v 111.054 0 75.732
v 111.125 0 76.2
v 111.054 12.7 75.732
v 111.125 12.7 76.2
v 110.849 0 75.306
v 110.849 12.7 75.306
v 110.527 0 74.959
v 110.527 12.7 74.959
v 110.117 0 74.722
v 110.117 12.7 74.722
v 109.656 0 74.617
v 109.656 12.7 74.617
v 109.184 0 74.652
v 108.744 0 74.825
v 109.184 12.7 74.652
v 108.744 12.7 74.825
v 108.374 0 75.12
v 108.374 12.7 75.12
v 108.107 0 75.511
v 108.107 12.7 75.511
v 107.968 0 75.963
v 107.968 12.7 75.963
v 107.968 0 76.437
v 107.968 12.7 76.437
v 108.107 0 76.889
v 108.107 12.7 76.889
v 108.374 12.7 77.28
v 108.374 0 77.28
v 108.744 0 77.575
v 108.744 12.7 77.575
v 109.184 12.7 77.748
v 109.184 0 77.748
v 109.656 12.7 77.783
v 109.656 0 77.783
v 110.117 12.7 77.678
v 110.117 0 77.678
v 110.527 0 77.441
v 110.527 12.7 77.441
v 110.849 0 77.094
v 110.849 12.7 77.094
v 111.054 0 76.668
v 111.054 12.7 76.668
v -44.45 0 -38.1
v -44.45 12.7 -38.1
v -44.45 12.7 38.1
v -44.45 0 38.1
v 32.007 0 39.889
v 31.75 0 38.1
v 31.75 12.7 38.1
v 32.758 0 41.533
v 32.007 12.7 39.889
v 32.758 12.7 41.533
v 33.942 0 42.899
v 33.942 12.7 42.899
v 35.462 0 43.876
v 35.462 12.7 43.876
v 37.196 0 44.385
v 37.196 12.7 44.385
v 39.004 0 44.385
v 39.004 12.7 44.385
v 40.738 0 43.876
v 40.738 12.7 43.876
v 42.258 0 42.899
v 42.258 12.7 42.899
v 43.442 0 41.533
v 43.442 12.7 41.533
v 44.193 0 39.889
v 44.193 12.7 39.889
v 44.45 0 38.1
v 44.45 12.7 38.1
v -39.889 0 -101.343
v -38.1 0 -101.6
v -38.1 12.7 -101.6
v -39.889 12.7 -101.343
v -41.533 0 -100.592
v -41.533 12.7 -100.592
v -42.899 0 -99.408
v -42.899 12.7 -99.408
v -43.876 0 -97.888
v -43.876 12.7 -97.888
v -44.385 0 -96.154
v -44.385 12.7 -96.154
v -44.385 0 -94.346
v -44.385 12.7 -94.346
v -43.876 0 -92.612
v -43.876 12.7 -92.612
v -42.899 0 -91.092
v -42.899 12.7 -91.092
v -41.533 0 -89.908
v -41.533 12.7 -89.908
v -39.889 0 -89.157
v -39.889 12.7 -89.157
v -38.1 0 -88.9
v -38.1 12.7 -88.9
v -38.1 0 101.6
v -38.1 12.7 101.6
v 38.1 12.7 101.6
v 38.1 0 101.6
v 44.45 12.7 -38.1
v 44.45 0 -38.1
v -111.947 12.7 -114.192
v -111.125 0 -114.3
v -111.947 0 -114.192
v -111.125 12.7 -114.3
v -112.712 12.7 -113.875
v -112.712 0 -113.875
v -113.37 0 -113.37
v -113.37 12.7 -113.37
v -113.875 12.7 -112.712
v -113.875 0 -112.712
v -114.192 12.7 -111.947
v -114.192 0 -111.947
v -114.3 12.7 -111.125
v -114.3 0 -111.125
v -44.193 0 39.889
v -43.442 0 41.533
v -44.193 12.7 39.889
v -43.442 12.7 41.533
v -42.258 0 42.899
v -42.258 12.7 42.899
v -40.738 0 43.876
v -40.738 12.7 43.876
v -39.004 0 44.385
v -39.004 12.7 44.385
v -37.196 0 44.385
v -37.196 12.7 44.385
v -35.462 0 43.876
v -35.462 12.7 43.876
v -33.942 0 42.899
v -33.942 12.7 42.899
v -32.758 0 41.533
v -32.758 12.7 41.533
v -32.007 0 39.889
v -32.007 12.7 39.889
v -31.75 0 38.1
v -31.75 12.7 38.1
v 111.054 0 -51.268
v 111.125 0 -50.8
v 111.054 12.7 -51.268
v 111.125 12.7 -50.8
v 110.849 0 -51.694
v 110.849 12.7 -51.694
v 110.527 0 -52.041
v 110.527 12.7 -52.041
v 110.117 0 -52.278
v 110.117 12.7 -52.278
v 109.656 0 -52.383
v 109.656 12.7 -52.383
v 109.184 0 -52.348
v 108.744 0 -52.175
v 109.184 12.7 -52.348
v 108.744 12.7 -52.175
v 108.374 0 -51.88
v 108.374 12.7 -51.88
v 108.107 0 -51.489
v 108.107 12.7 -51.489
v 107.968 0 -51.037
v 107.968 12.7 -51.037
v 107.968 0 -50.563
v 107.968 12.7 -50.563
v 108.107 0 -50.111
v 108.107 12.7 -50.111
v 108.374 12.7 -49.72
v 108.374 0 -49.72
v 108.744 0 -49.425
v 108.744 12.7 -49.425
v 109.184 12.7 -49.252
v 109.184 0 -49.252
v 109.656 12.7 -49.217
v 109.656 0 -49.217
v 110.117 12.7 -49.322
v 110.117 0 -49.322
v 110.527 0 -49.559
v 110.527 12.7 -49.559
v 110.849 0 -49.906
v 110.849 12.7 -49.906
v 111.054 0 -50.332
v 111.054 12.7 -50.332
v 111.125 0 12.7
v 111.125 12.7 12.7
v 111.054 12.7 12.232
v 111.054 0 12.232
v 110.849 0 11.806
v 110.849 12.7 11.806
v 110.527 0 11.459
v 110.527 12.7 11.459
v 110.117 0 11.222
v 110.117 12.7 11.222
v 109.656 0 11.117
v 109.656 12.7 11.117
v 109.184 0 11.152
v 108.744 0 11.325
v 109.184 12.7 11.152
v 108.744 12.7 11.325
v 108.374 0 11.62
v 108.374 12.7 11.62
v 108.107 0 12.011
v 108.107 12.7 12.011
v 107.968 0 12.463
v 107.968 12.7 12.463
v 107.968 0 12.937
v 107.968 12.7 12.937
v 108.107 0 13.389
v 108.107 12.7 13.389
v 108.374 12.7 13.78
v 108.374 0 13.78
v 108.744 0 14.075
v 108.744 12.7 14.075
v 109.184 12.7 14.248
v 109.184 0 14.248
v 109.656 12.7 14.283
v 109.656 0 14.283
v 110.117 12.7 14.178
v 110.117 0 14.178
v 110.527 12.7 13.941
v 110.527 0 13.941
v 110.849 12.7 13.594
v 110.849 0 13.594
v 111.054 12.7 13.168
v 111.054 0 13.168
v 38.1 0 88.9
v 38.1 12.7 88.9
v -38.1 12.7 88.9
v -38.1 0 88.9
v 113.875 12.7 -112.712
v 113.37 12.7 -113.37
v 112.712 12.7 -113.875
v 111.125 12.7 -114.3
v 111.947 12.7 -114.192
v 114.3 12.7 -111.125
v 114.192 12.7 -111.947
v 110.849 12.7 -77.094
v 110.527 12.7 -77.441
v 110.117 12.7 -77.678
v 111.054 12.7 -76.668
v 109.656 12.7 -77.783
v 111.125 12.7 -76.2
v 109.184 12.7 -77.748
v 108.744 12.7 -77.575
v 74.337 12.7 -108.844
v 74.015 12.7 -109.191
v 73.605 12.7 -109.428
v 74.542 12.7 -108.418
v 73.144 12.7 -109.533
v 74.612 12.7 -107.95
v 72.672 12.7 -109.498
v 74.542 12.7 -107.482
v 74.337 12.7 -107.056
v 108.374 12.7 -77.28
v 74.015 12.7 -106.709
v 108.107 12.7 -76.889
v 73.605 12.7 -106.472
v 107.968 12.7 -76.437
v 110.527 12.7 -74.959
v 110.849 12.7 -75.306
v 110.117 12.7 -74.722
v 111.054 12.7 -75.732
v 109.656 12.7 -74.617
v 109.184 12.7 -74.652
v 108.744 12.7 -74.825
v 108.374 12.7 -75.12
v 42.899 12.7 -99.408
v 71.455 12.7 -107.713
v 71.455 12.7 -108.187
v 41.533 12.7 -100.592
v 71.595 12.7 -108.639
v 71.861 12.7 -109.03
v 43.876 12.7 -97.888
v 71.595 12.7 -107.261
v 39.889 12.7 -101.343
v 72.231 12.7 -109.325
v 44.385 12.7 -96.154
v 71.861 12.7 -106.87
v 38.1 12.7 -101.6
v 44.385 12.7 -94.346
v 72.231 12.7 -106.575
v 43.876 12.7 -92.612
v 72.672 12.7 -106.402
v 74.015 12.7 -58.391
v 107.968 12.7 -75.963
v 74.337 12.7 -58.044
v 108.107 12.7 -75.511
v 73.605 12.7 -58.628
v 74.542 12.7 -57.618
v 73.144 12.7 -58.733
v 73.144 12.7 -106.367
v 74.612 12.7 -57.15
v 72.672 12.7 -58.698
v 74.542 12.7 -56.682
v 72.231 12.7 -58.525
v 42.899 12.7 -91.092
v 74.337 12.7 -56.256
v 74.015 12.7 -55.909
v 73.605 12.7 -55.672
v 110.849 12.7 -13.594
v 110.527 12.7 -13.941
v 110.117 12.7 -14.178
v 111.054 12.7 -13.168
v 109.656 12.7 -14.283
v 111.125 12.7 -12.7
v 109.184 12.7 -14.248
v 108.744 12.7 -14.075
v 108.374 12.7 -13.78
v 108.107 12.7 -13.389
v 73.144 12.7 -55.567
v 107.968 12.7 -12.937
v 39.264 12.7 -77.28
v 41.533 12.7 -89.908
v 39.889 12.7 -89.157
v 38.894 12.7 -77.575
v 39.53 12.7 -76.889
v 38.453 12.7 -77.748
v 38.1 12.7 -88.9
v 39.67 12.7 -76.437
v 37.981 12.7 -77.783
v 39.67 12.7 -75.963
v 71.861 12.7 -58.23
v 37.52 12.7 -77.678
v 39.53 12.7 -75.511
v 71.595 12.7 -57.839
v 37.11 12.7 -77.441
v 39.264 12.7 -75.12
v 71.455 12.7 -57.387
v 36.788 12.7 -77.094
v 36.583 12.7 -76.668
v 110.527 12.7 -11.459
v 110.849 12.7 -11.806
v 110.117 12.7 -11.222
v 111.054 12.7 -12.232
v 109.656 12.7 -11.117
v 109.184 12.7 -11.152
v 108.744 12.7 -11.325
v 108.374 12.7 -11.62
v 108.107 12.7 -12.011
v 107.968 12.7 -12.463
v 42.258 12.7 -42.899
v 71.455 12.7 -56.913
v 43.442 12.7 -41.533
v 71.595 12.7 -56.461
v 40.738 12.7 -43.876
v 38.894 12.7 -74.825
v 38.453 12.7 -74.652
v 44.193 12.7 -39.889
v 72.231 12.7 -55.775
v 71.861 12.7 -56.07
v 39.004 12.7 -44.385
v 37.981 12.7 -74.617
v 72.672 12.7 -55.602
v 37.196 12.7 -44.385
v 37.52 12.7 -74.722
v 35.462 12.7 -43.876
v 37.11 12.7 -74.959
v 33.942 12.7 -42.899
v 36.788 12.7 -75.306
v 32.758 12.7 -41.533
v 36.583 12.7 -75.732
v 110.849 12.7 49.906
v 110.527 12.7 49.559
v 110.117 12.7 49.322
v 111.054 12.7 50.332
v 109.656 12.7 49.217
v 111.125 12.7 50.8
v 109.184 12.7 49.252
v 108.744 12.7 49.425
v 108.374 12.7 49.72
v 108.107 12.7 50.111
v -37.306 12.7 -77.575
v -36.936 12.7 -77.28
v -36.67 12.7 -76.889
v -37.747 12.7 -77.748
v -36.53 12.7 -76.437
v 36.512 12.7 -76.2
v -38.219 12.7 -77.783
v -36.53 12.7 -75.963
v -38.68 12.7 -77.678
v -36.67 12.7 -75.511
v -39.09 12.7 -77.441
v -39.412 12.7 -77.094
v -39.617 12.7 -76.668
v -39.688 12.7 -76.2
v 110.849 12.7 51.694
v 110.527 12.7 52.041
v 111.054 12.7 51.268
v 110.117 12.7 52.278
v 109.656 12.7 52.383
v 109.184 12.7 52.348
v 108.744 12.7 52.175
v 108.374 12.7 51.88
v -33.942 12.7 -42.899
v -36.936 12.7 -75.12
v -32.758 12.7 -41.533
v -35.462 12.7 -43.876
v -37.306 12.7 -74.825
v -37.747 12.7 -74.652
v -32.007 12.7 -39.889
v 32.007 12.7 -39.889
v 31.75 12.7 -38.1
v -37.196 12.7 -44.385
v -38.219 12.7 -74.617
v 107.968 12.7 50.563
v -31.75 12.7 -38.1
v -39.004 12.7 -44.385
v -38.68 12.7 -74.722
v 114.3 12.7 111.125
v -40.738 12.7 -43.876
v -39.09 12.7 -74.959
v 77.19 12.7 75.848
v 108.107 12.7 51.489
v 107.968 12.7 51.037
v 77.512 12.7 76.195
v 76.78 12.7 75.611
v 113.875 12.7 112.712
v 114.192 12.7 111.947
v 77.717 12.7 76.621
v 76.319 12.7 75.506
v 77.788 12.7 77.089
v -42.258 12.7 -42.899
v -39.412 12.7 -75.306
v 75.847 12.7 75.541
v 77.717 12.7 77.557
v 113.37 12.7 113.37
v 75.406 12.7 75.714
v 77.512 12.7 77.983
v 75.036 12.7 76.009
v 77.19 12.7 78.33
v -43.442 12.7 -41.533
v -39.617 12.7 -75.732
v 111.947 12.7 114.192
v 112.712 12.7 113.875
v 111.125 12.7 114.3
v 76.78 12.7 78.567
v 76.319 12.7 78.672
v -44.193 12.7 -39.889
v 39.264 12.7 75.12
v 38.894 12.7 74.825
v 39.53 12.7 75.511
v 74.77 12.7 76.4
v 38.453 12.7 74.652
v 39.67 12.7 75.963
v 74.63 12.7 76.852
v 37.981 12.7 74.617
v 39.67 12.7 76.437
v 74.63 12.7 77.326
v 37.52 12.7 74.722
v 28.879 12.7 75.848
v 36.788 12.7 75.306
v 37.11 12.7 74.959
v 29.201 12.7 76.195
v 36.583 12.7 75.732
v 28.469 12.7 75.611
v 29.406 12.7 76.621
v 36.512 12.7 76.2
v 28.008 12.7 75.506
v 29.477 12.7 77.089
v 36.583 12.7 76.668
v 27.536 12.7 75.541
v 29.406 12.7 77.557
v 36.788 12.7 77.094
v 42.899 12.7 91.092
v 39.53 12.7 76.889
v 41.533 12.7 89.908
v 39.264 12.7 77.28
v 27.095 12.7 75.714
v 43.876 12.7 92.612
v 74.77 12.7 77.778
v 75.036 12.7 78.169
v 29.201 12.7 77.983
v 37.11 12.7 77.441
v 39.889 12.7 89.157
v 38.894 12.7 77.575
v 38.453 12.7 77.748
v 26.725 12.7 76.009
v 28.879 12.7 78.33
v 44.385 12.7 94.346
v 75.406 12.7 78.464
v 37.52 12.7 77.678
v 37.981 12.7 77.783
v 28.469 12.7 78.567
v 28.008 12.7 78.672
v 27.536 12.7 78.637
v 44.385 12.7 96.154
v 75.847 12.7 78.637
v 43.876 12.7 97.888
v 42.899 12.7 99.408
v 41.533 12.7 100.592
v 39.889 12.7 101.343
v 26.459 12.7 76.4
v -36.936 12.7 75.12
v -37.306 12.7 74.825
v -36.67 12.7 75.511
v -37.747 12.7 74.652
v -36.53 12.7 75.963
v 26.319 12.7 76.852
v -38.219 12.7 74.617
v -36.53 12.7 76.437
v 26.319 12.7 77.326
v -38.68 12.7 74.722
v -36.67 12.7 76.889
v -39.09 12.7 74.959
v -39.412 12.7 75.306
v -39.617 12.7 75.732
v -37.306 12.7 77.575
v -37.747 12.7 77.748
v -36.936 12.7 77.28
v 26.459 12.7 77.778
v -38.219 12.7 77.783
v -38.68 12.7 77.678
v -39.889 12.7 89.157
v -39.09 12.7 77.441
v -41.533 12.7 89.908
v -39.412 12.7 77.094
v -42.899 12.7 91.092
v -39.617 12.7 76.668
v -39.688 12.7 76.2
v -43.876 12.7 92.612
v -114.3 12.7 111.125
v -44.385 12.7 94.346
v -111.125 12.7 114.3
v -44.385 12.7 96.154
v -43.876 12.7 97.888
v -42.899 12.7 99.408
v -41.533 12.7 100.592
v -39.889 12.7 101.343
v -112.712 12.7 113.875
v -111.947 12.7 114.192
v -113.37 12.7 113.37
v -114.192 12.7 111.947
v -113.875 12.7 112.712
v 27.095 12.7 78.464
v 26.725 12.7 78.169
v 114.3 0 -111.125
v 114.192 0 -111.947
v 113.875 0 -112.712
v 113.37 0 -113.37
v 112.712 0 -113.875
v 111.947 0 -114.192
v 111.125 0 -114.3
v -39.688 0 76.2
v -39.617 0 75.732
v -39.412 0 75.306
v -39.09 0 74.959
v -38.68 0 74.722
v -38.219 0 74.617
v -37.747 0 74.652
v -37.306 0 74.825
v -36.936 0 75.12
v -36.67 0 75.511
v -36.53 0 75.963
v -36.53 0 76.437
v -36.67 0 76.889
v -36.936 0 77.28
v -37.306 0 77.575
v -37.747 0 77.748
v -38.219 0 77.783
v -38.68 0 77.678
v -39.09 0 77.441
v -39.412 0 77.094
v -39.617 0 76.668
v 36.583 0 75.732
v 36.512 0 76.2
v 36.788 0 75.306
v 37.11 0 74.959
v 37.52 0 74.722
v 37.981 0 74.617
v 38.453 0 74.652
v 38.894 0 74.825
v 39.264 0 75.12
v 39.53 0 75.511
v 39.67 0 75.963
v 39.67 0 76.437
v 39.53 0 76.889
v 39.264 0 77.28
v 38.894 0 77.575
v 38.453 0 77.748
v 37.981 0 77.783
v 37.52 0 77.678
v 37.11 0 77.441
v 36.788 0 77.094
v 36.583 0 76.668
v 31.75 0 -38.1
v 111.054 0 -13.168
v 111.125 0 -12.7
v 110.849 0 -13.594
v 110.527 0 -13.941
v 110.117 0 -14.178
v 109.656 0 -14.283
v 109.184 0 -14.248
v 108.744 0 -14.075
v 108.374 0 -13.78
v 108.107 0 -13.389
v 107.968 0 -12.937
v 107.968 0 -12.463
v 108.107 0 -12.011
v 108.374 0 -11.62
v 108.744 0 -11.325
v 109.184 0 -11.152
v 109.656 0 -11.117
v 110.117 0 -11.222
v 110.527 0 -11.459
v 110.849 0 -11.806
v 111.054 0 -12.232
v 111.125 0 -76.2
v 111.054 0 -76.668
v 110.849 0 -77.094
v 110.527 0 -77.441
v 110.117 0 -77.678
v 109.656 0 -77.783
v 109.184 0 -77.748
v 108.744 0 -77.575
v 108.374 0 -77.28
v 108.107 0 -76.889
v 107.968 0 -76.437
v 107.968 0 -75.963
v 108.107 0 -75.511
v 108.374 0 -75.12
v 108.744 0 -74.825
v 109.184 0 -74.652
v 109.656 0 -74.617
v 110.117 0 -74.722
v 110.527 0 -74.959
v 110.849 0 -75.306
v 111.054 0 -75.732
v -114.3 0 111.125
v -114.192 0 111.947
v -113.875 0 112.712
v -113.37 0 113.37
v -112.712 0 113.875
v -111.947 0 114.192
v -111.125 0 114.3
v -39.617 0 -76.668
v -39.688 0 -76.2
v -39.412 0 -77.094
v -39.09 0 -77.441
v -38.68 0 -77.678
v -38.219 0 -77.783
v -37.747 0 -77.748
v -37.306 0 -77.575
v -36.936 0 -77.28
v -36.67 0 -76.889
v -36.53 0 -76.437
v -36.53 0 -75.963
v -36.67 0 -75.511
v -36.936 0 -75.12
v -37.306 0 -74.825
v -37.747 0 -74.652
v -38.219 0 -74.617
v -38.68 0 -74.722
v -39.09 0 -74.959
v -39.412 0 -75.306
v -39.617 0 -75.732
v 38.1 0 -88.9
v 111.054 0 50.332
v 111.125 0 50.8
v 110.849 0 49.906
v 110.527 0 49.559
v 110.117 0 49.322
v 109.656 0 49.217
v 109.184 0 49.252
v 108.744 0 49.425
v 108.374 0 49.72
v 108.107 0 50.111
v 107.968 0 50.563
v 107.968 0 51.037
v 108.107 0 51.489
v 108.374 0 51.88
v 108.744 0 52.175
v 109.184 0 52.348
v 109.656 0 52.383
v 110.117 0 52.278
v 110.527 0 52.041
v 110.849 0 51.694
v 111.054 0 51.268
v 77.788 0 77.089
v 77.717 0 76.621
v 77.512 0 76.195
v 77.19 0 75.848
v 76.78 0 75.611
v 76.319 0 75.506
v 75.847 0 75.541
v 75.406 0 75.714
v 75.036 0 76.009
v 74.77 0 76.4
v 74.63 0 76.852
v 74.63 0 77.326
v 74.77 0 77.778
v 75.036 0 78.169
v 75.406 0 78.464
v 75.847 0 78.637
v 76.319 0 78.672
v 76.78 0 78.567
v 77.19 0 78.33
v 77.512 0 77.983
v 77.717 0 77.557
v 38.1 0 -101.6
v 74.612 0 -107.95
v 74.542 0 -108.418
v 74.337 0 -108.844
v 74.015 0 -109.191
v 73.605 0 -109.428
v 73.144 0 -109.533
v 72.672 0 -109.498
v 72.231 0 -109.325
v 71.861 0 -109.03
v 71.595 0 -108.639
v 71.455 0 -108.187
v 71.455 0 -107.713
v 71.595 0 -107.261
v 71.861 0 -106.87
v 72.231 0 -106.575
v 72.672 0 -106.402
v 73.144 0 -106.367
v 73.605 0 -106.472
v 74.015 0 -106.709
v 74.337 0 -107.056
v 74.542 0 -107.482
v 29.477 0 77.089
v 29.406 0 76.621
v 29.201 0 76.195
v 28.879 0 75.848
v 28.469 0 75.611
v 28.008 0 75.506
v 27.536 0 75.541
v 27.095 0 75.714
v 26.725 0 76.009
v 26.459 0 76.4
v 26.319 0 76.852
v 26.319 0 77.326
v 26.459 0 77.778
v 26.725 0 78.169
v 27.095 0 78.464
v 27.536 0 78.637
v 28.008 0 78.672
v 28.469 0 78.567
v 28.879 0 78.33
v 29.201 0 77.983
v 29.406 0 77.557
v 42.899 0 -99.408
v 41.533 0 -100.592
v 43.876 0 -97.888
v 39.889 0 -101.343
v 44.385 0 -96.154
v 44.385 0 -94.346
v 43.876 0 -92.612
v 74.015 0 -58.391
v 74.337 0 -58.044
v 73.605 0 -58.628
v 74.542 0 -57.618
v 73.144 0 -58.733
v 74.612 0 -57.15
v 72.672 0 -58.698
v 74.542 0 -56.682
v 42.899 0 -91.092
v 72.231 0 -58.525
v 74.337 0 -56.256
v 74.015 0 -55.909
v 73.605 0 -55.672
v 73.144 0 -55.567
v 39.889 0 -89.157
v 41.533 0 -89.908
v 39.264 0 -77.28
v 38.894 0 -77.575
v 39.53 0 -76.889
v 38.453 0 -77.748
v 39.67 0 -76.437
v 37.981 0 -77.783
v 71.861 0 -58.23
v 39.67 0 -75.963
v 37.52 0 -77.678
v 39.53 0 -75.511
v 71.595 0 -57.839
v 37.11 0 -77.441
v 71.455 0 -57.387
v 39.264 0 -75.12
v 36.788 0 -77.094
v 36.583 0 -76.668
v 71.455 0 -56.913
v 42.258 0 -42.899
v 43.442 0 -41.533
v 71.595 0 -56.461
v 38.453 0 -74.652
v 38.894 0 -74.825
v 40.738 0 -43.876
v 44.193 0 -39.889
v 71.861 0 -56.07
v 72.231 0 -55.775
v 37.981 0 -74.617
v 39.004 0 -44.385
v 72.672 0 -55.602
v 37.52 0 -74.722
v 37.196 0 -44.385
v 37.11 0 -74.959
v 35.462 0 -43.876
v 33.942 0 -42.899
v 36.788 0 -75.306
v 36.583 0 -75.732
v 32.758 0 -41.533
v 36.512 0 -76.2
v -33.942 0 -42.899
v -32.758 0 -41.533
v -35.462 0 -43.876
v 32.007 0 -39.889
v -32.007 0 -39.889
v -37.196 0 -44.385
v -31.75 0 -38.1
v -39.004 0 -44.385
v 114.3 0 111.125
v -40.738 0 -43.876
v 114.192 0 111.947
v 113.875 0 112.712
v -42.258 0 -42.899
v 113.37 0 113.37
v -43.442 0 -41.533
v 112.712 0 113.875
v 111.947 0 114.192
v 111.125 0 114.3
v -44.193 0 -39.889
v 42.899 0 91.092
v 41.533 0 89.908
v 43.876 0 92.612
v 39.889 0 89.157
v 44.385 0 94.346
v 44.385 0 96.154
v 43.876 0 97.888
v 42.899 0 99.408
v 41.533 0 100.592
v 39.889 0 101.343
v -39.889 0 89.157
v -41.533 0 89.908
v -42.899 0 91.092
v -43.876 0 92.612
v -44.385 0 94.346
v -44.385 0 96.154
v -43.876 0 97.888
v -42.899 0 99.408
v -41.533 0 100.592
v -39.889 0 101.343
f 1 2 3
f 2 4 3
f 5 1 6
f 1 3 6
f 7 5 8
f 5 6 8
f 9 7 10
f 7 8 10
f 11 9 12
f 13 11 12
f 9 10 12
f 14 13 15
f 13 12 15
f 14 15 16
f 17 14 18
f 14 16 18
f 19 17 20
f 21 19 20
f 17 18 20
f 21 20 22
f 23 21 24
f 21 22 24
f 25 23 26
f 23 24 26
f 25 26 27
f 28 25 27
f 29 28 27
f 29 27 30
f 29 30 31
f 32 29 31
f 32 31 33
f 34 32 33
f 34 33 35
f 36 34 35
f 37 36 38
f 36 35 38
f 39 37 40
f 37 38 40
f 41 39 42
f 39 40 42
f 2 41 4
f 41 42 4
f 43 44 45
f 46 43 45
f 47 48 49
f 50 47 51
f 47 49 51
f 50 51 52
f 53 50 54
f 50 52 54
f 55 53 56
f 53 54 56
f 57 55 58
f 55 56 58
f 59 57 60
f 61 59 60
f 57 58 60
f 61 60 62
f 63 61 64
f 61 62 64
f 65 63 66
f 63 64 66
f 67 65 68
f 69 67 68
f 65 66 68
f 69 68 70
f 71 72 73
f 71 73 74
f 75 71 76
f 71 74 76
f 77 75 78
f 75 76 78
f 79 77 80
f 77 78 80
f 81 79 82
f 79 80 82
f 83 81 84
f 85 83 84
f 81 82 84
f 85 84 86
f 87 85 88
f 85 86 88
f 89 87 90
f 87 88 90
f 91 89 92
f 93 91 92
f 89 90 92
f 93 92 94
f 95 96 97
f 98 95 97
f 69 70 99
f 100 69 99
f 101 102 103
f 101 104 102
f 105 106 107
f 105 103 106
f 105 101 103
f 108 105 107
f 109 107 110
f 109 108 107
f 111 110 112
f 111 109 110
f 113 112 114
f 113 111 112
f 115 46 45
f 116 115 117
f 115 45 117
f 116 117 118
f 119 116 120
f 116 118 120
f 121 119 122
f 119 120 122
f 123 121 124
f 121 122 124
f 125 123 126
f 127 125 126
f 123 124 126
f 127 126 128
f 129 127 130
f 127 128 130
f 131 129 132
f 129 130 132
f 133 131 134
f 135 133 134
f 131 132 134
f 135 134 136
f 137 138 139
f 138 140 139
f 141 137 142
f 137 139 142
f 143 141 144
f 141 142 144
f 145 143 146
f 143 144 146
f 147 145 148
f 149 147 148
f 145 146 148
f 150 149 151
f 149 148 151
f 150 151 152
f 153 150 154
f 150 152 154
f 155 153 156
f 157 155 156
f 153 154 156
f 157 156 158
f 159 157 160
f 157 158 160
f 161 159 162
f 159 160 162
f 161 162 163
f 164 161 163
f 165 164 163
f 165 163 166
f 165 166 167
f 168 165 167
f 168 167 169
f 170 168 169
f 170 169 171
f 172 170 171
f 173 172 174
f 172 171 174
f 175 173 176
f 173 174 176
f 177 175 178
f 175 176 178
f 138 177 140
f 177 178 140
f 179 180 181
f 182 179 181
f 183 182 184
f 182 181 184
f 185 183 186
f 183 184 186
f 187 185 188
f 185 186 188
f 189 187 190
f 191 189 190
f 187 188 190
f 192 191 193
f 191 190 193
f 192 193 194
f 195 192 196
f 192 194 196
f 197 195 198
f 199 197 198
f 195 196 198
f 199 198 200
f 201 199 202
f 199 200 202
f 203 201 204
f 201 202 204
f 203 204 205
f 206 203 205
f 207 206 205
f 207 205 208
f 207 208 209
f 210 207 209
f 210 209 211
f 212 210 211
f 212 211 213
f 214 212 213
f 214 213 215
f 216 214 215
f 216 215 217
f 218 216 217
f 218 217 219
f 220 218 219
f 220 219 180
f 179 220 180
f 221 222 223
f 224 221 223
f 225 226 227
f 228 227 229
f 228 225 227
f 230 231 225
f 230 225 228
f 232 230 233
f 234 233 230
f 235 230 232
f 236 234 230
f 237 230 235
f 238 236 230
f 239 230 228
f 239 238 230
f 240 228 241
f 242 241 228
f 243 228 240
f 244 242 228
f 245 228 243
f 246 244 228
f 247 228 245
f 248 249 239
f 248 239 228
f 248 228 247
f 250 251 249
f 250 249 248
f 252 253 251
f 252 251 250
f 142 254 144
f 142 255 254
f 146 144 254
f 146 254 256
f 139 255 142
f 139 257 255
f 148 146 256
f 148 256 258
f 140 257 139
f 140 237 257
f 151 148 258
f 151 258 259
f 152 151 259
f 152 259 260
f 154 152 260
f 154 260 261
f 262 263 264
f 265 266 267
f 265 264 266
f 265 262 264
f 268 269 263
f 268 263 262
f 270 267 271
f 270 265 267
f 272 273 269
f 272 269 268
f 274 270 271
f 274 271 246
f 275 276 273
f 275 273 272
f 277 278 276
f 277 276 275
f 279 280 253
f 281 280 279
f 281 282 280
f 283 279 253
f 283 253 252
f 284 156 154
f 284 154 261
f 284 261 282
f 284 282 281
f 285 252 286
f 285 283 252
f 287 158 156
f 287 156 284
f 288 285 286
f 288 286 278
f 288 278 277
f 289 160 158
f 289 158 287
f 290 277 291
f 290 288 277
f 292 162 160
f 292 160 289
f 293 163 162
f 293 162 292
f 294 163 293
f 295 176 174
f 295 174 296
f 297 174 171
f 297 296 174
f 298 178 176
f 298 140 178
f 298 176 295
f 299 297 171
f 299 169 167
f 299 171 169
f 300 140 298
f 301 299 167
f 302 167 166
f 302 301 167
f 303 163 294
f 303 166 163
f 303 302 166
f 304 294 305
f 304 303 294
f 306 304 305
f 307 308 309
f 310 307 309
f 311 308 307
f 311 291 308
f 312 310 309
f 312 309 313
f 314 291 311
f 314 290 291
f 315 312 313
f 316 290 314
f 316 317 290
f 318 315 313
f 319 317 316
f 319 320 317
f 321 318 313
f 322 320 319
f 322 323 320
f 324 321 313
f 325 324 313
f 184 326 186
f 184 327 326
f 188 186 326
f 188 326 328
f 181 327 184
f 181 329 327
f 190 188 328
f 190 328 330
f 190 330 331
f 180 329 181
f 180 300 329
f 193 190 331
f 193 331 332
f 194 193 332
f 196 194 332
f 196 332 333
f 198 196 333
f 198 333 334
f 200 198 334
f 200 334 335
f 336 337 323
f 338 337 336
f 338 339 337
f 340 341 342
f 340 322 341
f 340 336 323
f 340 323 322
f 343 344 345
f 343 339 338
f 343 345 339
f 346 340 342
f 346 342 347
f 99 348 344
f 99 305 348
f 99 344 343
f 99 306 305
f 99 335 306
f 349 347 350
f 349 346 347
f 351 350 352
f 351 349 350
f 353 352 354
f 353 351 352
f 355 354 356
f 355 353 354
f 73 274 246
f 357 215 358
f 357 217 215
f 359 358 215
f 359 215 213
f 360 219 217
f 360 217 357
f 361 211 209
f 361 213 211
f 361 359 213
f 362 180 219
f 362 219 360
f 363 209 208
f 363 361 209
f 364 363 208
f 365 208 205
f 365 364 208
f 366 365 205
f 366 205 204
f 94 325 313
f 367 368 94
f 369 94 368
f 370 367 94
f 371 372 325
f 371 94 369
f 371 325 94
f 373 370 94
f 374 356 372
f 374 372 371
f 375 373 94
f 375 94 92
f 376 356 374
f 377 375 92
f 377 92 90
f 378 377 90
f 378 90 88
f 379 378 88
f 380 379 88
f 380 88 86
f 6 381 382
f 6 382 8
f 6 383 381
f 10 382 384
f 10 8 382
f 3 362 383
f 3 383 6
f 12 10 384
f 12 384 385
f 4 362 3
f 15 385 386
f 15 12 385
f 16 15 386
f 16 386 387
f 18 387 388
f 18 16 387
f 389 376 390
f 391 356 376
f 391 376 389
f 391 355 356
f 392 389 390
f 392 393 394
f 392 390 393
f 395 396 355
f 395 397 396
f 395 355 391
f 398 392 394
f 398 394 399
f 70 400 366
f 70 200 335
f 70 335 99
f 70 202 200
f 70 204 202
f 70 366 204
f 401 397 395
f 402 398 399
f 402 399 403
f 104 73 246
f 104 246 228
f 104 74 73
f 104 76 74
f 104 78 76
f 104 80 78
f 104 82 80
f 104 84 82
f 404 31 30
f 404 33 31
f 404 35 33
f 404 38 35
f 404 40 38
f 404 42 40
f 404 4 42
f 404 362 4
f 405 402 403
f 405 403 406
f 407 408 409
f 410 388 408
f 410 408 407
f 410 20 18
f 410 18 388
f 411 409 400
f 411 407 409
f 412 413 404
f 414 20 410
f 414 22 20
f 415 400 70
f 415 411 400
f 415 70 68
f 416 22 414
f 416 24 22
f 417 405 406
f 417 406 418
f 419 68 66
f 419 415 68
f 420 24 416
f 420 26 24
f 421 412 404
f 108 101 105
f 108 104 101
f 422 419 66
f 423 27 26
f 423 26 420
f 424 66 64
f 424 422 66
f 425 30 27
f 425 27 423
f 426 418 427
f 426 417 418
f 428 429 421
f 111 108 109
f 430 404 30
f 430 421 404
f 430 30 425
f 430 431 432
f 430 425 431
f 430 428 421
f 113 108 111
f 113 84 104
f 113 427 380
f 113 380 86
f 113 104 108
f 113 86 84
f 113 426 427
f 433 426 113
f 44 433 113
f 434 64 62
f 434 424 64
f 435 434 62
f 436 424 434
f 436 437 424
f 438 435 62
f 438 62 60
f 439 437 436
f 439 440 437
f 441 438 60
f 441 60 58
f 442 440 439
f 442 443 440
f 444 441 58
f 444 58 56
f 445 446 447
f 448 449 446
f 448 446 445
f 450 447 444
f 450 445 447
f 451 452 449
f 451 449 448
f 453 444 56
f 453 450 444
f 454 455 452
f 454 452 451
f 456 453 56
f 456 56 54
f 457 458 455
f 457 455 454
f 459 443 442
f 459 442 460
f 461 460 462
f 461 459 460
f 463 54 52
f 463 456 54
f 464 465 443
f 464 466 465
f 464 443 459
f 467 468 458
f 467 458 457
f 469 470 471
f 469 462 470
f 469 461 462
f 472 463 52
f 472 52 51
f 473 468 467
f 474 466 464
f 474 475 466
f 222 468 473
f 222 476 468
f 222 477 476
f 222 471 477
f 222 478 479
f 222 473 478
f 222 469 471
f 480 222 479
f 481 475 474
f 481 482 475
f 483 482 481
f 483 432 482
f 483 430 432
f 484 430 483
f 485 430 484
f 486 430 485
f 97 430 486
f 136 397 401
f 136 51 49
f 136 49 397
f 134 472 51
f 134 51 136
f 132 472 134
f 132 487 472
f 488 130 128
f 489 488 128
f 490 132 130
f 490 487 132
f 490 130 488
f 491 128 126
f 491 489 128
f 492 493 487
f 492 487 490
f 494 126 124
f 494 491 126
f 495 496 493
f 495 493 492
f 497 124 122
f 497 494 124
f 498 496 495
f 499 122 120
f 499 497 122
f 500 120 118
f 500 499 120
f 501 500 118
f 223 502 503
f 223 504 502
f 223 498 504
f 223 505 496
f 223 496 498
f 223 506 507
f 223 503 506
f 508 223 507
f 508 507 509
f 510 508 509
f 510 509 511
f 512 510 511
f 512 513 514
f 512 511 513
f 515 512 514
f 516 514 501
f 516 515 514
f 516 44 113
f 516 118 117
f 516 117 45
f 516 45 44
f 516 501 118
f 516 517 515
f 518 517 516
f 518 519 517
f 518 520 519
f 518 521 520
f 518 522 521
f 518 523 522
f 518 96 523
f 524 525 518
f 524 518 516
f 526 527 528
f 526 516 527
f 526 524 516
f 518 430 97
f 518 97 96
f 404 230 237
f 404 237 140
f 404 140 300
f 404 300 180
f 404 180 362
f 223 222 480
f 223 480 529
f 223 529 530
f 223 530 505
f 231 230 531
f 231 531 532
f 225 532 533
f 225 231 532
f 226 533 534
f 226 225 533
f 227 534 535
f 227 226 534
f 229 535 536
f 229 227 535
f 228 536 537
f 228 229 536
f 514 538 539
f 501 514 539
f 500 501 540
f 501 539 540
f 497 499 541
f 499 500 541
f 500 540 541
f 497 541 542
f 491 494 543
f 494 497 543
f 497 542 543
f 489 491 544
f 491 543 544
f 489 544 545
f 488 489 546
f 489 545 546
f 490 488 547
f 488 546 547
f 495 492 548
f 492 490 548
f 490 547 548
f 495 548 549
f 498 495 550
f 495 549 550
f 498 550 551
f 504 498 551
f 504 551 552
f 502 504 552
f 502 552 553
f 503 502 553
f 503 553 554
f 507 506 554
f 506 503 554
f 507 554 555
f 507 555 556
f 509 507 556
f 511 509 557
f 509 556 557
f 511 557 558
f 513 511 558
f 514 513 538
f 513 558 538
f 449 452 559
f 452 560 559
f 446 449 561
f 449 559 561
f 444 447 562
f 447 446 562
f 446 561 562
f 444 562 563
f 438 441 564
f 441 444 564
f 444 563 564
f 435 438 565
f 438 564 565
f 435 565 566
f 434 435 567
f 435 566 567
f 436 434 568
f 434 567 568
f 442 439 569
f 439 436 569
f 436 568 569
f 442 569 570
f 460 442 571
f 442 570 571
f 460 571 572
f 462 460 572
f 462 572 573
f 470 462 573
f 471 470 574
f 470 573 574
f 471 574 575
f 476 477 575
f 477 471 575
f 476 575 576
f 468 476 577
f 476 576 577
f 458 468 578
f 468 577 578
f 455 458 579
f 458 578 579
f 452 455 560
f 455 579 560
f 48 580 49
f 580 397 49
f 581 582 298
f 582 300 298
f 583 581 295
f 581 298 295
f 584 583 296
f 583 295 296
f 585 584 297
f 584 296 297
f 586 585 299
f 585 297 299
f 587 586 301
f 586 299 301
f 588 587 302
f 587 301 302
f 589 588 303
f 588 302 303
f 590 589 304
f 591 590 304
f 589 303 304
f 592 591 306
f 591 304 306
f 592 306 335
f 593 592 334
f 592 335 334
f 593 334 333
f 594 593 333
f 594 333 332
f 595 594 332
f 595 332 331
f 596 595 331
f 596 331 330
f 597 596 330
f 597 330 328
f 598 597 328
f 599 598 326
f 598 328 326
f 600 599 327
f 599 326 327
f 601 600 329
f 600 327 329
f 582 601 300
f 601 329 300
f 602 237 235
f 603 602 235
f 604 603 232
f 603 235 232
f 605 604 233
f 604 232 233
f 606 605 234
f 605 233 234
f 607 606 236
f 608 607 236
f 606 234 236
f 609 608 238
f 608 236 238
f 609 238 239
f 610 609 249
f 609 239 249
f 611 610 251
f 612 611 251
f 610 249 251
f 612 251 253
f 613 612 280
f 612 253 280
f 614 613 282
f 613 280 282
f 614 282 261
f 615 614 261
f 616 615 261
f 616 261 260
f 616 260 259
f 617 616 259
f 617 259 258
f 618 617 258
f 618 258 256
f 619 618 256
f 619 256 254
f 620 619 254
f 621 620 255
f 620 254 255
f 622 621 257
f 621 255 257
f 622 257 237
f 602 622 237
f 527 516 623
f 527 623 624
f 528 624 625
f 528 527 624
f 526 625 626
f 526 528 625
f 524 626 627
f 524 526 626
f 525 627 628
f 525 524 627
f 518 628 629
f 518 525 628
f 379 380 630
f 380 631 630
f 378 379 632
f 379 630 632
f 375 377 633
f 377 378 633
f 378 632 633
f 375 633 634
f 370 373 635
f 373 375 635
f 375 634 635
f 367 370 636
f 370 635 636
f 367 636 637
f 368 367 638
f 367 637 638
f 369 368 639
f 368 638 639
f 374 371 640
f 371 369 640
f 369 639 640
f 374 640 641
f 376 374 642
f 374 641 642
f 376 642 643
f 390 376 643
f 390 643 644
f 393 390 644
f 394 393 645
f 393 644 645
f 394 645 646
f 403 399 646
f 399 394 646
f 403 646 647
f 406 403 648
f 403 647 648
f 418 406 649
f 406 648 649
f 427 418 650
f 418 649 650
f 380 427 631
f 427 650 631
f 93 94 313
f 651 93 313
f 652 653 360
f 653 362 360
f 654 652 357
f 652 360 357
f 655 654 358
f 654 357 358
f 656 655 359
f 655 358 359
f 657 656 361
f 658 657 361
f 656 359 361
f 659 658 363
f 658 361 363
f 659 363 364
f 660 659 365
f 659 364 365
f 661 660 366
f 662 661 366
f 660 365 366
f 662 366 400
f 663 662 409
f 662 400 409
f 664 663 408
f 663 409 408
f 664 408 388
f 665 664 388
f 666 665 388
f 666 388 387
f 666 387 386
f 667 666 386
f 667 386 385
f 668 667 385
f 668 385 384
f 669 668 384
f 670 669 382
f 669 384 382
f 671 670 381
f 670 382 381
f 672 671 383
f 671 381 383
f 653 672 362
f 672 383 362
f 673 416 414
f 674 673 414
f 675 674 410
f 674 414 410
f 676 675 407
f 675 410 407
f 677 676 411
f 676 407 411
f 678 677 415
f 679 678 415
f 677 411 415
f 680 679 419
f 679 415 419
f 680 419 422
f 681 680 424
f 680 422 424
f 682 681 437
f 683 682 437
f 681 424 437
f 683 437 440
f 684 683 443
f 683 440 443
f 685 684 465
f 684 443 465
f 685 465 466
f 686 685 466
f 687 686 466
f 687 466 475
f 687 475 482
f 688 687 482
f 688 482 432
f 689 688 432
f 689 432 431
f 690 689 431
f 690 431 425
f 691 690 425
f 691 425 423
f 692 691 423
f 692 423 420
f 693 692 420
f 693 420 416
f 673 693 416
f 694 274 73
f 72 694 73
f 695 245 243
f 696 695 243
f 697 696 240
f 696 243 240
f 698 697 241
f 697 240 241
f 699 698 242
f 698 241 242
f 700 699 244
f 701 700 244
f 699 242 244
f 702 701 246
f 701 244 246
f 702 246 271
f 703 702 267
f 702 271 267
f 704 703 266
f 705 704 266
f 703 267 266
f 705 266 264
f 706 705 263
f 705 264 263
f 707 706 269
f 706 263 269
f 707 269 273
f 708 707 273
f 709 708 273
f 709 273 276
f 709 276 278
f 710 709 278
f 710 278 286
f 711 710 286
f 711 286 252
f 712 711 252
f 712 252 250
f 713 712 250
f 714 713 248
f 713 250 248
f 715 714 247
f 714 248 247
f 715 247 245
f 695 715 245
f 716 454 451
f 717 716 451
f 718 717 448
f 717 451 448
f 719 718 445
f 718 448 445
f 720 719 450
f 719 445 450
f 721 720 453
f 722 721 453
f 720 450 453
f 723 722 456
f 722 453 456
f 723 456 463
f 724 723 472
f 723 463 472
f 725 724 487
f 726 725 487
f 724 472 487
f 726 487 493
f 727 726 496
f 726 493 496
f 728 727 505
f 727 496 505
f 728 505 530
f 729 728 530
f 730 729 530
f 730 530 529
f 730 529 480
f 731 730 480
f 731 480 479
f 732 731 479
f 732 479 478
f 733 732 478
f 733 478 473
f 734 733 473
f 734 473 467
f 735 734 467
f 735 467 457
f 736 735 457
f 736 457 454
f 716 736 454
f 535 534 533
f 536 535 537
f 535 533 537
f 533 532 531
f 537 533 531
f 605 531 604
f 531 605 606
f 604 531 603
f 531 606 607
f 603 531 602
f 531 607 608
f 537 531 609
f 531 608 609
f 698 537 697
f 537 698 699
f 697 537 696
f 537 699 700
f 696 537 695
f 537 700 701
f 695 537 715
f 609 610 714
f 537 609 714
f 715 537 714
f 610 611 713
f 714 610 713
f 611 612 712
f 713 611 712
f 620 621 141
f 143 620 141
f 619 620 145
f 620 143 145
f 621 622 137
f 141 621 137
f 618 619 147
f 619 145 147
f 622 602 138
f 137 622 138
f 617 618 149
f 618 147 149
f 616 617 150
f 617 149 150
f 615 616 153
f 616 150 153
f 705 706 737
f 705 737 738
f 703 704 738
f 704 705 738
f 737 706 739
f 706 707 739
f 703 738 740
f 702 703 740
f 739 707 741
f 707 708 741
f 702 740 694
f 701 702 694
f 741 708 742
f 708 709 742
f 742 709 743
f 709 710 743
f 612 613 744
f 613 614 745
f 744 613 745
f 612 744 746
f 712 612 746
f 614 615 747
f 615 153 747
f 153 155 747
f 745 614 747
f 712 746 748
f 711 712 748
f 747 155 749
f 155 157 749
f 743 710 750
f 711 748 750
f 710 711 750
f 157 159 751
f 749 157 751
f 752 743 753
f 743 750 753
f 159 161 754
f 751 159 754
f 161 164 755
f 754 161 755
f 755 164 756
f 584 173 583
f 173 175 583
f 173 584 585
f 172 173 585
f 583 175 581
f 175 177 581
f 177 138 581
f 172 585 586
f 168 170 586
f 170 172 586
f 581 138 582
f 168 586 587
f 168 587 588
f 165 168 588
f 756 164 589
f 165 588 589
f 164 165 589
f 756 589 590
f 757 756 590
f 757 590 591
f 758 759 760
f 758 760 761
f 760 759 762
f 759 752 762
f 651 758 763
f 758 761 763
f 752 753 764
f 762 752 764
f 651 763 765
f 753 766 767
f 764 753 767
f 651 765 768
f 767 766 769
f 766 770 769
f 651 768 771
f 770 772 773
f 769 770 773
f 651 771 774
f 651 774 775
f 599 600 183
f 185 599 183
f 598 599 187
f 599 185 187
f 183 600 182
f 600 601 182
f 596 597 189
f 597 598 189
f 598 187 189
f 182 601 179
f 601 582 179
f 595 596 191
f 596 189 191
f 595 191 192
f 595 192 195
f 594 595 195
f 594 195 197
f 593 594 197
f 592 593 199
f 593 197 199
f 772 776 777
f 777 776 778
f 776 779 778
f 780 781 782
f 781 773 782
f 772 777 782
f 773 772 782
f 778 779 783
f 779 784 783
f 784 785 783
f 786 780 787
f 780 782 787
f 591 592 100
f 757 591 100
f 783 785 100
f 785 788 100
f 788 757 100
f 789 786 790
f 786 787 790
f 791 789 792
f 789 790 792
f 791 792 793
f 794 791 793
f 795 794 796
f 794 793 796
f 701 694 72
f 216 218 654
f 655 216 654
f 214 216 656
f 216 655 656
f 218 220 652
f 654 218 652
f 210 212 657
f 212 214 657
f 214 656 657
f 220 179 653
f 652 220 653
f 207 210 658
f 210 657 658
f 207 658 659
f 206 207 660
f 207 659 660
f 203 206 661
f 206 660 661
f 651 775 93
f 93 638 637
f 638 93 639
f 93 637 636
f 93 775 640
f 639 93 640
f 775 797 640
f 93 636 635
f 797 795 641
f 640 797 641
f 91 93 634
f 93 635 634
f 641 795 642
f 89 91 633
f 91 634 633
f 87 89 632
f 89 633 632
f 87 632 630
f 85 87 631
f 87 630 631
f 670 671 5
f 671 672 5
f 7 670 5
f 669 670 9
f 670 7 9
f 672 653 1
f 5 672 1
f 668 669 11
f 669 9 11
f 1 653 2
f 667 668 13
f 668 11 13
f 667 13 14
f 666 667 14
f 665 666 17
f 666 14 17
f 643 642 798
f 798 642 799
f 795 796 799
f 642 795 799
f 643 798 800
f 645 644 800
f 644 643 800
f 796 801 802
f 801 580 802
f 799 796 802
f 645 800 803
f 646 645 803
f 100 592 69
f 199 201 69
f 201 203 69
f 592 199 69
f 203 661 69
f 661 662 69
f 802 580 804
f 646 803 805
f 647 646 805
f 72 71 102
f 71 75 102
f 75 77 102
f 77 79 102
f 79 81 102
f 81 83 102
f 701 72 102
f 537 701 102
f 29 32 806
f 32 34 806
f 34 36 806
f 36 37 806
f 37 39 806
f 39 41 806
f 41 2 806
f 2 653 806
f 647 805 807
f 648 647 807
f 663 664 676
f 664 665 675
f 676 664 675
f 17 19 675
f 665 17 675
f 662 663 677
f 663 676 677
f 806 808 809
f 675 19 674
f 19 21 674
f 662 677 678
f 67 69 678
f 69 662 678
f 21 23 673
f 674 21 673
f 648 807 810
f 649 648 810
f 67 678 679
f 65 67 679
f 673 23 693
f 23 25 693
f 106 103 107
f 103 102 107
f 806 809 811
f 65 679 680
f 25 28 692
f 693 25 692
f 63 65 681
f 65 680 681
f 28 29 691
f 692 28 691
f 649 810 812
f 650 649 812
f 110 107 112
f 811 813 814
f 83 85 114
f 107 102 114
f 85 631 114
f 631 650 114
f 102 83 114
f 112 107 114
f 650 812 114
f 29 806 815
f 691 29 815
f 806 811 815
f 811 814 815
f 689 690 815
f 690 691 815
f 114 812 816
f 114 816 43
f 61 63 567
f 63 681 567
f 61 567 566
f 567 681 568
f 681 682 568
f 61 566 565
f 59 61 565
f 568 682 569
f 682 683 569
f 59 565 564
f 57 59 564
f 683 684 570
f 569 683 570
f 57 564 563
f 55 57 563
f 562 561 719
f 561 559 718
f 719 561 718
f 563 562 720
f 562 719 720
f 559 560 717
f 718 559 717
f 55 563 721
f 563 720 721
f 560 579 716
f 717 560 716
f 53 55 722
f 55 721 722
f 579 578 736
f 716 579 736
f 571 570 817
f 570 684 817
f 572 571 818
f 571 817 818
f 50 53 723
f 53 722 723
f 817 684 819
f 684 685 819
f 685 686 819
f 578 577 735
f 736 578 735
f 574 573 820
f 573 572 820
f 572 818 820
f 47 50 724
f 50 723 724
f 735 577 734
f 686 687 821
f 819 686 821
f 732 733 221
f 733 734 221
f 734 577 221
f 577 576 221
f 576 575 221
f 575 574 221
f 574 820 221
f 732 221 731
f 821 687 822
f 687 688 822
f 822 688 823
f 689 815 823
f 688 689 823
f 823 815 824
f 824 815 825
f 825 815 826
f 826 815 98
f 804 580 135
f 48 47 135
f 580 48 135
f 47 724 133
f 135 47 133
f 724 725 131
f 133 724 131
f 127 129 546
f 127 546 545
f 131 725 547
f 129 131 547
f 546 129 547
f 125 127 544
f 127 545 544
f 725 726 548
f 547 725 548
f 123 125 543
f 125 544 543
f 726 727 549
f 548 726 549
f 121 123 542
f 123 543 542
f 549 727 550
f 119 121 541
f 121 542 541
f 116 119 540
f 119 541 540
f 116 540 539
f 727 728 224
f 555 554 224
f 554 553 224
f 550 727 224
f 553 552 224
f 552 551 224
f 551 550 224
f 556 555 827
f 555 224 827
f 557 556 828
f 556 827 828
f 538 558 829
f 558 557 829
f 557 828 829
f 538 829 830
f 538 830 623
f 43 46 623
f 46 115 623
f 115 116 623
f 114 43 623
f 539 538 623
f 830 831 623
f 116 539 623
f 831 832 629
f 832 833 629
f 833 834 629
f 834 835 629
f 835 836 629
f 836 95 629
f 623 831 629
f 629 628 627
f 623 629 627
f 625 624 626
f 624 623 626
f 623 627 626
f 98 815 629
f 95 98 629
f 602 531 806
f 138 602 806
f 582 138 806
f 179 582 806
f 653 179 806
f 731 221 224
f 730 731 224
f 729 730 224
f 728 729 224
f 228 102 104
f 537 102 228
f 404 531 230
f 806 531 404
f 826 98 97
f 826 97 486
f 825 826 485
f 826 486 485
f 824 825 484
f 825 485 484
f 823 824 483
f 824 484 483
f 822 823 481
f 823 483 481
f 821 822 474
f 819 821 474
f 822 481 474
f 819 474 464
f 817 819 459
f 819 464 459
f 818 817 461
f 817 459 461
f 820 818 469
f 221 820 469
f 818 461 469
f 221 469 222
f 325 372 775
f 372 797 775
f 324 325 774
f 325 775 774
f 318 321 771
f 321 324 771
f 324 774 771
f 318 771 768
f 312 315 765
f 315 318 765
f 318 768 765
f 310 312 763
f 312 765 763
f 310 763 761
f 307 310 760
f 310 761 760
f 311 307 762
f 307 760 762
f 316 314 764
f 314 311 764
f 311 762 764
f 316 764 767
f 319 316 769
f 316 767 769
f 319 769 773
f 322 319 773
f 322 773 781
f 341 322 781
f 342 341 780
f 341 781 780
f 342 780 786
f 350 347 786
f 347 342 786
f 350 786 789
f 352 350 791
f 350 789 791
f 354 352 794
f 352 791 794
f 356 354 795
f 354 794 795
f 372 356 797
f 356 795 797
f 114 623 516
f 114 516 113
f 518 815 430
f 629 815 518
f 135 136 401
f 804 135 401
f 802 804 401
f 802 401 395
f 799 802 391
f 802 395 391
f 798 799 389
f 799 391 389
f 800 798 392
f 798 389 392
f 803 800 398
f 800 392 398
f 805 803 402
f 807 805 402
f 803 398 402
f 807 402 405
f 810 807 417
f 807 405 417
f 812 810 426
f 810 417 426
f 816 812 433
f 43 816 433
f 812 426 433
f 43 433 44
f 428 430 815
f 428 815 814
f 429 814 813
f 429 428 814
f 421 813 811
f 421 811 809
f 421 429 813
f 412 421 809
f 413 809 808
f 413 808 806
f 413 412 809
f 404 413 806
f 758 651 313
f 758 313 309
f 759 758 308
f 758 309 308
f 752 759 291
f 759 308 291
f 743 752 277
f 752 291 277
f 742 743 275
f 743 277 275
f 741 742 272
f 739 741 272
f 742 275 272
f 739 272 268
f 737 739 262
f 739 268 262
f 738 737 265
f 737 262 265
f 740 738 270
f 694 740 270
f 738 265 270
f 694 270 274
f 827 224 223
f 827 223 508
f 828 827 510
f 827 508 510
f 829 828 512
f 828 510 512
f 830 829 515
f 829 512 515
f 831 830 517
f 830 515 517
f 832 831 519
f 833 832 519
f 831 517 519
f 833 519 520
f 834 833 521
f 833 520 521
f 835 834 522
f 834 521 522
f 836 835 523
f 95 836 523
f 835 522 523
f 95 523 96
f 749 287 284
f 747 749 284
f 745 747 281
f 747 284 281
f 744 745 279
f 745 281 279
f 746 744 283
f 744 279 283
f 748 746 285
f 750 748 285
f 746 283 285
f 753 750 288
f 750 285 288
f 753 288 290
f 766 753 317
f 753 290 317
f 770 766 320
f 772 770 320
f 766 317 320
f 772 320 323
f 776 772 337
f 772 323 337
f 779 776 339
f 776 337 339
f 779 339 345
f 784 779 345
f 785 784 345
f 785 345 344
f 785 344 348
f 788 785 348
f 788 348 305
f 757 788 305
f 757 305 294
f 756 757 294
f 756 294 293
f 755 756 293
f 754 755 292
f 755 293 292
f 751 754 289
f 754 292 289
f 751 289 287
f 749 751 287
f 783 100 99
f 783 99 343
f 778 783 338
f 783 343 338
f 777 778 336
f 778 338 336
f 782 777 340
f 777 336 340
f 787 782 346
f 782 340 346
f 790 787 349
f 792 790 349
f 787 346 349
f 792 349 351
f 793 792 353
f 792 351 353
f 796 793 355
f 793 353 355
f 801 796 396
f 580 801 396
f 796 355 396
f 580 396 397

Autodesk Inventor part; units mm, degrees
ref_plane "YZ Plane" through (0, 0, 0) normal (1, 0, 0) x (0, 1, 0)
ref_plane "XZ Plane" through (0, 0, 0) normal (0, 1, 0) x (-1, 0, 0)
ref_plane "XY Plane" through (0, 0, 0) normal (0, 0, 1) x (1, 0, 0)
sketch "Sketch1" plane through (0, 0, 0) normal (0, 1, 0) x (-1, 0, 0)
  line L0 (-114.3, 114.3) -> (114.3, 114.3)
  line L1 (114.3, 114.3) -> (114.3, -114.3)
  line L2 (114.3, -114.3) -> (-114.3, -114.3)
  line L3 (-114.3, -114.3) -> (-114.3, 114.3)
  line L4 (-114.3, 114.3) -> (114.3, -114.3) construction
  line L5 (114.3, 114.3) -> (-114.3, -114.3) construction
  line L6 (114.3, 114.3) -> (38.1, 114.3)
  line L7 (38.1, 114.3) -> (38.1, 76.2) construction
  line L8 (38.1, 76.2) -> (114.3, 76.2) construction
  line L9 (114.3, 76.2) -> (114.3, 114.3)
  circle A0 centre (38.1, 76.2) radius 1.5875
  line L10 (114.3, 0) -> (47.3217, 0)
  line L11 (-114.3, 114.3) -> (-38.1, 114.3)
  line L12 (-38.1, 114.3) -> (-38.1, 76.2) construction
  line L13 (-38.1, 76.2) -> (-114.3, 76.2) construction
  line L14 (-114.3, 76.2) -> (-114.3, 114.3)
  circle A1 centre (-38.1, 76.2) radius 1.5875
  line L15 (-114.3, -114.3) -> (-38.1, -114.3)
  line L16 (-38.1, -114.3) -> (-38.1, -76.2) construction
  line L17 (-38.1, -76.2) -> (-114.3, -76.2) construction
  line L18 (-114.3, -76.2) -> (-114.3, -114.3)
  line L19 (114.3, -114.3) -> (38.1, -114.3)
  line L20 (38.1, -114.3) -> (38.1, -76.2) construction
  line L21 (38.1, -76.2) -> (114.3, -76.2) construction
  line L22 (114.3, -76.2) -> (114.3, -114.3)
  circle A2 centre (-38.1, -76.2) radius 1.5875
  circle A3 centre (38.1, -76.2) radius 1.5875
  point P0 (0, 0)
  dimension "d0" = 228.6
  dimension "d1" = 228.6
  dimension "d2" = 76.2
  dimension "d3" = 38.1
  dimension "d4" = 3.175
  dimension "d5" = 76.2
  dimension "d6" = 3.175
  dimension "d7" = 38.1
  dimension "d8" = 76.2
  dimension "d9" = 3.175
  dimension "d10" = 3.175
extrude "Extrusion1" add sketch "Sketch1" along normal blind 12.7
fillet "Fillet1" radius 3.175 4 edges at (-114.3, 6.35, 114.3) (114.3, 6.35, 114.3) (114.3, 6.35, -114.3) (-114.3, 6.35, -114.3)
sketch "Sketch4" plane through (0, 12.7, 0) normal (0, 1, 0) x (1, 0, 0)
  circle A0 centre (-38.1, 76.2) radius 1.5875 projected
  circle A1 centre (38.1, 76.2) radius 1.5875 projected
  circle A2 centre (38.1, -76.2) radius 1.5875 projected
  circle A3 centre (-38.1, -76.2) radius 1.5875 projected
  arc A4 (-111.125, 114.3) -> (-114.3, 111.125) centre (-111.125, 111.125) ccw projected
  line L0 (-114.3, 111.125) -> (-114.3, -111.125) projected
  arc A5 (-114.3, -111.125) -> (-111.125, -114.3) centre (-111.125, -111.125) ccw projected
  line L1 (-111.125, -114.3) -> (111.125, -114.3) projected
  arc A6 (111.125, -114.3) -> (114.3, -111.125) centre (111.125, -111.125) ccw projected
  line L2 (114.3, -111.125) -> (114.3, 111.125) projected
  arc A7 (114.3, 111.125) -> (111.125, 114.3) centre (111.125, 111.125) ccw projected
  line L3 (111.125, 114.3) -> (-111.125, 114.3) projected
  line L4 (114.3, 114.3) -> (73.025, 114.3) construction
  line L5 (73.025, 114.3) -> (73.025, 107.95) construction
  line L6 (73.025, 107.95) -> (114.3, 107.95) construction
  line L7 (114.3, 107.95) -> (114.3, 114.3) construction
  line L8 (114.3, 114.3) -> (73.025, 114.3) construction
  line L9 (73.025, 114.3) -> (73.025, 57.15) construction
  line L10 (73.025, 57.15) -> (114.3, 57.15) construction
  line L11 (114.3, 57.15) -> (114.3, 114.3) construction
  circle A8 centre (73.025, 57.15) radius 1.5875
  circle A9 centre (73.025, 107.95) radius 1.5875
  point P0 (0, 0)
  dimension "d22" = 41.275
  dimension "d23" = 6.35
  dimension "d24" = 57.15
  dimension "d25" = 3.175
  dimension "d26" = 3.175
extrude "camMount" cut sketch "Sketch4" against normal up to surface (12.7 mm away) contours A8 | A9
sketch "Sketch5" plane through (0, 12.7, 0) normal (0, 1, 0) x (1, 0, 0)
  circle A0 centre (73.025, 57.15) radius 1.5875 construction
  circle A1 centre (73.025, 107.95) radius 1.5875 construction
  circle A2 centre (-38.1, 76.2) radius 1.5875 construction
  circle A3 centre (38.1, 76.2) radius 1.5875 construction
  circle A4 centre (38.1, -76.2) radius 1.5875 construction
  circle A5 centre (-38.1, -76.2) radius 1.5875 construction
  arc A6 (-111.125, 114.3) -> (-114.3, 111.125) centre (-111.125, 111.125) ccw construction
  line L0 (-114.3, 111.125) -> (-114.3, -111.125) construction
  arc A7 (-114.3, -111.125) -> (-111.125, -114.3) centre (-111.125, -111.125) ccw construction
  line L1 (-111.125, -114.3) -> (111.125, -114.3) construction
  arc A8 (111.125, -114.3) -> (114.3, -111.125) centre (111.125, -111.125) ccw construction
  line L2 (114.3, -111.125) -> (114.3, 111.125) construction
  arc A9 (114.3, 111.125) -> (111.125, 114.3) centre (111.125, 111.125) ccw construction
  line L3 (111.125, 114.3) -> (-111.125, 114.3) construction
  line L4 (114.3, -114.3) -> (107.95, -114.3) construction
  line L5 (107.95, -77.089) -> (114.3, -77.089) construction
  line L6 (114.3, -77.089) -> (114.3, -114.3) construction
  line L7 (114.3, -114.3) -> (59.6392, -114.3) construction
  line L8 (59.6392, -77.089) -> (114.3, -77.089) construction
  line L9 (114.3, -77.089) -> (114.3, -114.3) construction
  line L10 (114.3, -114.3) -> (27.8892, -114.3) construction
  line L11 (27.8892, -114.3) -> (27.8892, -77.089) construction
  line L12 (27.8892, -77.089) -> (114.3, -77.089) construction
  line L13 (114.3, -77.089) -> (114.3, -114.3) construction
  line L14 (114.3, -114.3) -> (76.2, -114.3) construction
  line L15 (76.2, -114.3) -> (76.2, -77.089) construction
  line L16 (76.2, -77.089) -> (114.3, -77.089) construction
  line L17 (114.3, -77.089) -> (114.3, -114.3) construction
  circle A10 centre (76.2, -77.089) radius 1.5875 construction
  circle A11 centre (76.2, -77.089) radius 1.5875
  circle A12 centre (27.8892, -77.089) radius 1.5875
  point P0 (0, 0)
  dimension "d29" = 6.35
  dimension "d30" = 37.211
  dimension "d31" = 54.6608
  dimension "d36" = 86.4108
  dimension "d37" = 38.1
  dimension "d38" = 3.175
extrude "TilitMount" cut sketch "Sketch5" against normal up to surface (12.7 mm away)
sketch "Sketch6" plane through (0, 12.7, 0) normal (0, 1, 0) x (1, 0, 0)
  line L0 (38.1, -95.25) -> (-38.1, -95.25)
  line L1 (-38.1, -95.25) -> (-38.1, 95.25)
  line L2 (-38.1, 95.25) -> (38.1, 95.25)
  line L3 (38.1, 95.25) -> (38.1, -95.25)
  line L4 (38.1, -95.25) -> (-38.1, 95.25) construction
  line L5 (-38.1, -95.25) -> (38.1, 95.25) construction
  line L6 (-38.1, -95.25) -> (38.1, -95.25) construction
  line L7 (-38.1, -101.6) -> (38.1, -101.6)
  line L8 (38.1, -88.9) -> (-38.1, -88.9)
  arc A0 (-38.1, -88.9) -> (-38.1, -101.6) centre (-38.1, -95.25) ccw
  arc A1 (38.1, -101.6) -> (38.1, -88.9) centre (38.1, -95.25) ccw
  line L9 (-38.1, 95.25) -> (38.1, 95.25) construction
  line L10 (-38.1, 88.9) -> (38.1, 88.9)
  line L11 (38.1, 101.6) -> (-38.1, 101.6)
  arc A2 (-38.1, 101.6) -> (-38.1, 88.9) centre (-38.1, 95.25) ccw
  arc A3 (38.1, 88.9) -> (38.1, 101.6) centre (38.1, 95.25) ccw
  line L12 (38.1, -38.1) -> (-38.1, -38.1)
  line L13 (-38.1, -38.1) -> (-38.1, 38.1)
  line L14 (-38.1, 38.1) -> (38.1, 38.1)
  line L15 (38.1, 38.1) -> (38.1, -38.1)
  line L16 (38.1, -38.1) -> (-38.1, 38.1) construction
  line L17 (-38.1, -38.1) -> (38.1, 38.1) construction
  line L18 (38.1, -38.1) -> (38.1, 38.1) construction
  line L19 (44.45, -38.1) -> (44.45, 38.1)
  line L20 (31.75, 38.1) -> (31.75, -38.1)
  arc A4 (31.75, -38.1) -> (44.45, -38.1) centre (38.1, -38.1) ccw
  arc A5 (44.45, 38.1) -> (31.75, 38.1) centre (38.1, 38.1) ccw
  line L21 (-38.1, -38.1) -> (-38.1, 38.1) construction
  line L22 (-31.75, -38.1) -> (-31.75, 38.1)
  line L23 (-44.45, 38.1) -> (-44.45, -38.1)
  arc A6 (-44.45, -38.1) -> (-31.75, -38.1) centre (-38.1, -38.1) ccw
  arc A7 (-31.75, 38.1) -> (-44.45, 38.1) centre (-38.1, 38.1) ccw
  point P0 (0, 0)
  point P1 (0, -95.25)
  point P2 (0, 95.25)
  point P3 (38.1, 0)
  point P4 (-38.1, 0)
  dimension "d39" = 76.2
  dimension "d40" = 190.5
  dimension "d41" = 12.7
  dimension "d42" = 12.7
  dimension "d43" = 76.2
  dimension "d44" = 12.7
  dimension "d45" = 12.7
extrude "Extrusion6" cut sketch "Sketch6" against normal blind 25.4 contours L3 A1 L7 A0 L1 L0 | L0 L1 L8 L3 | A4 L12 L3 | L3 A5 L19 A4 | A6 L23 A7 L1 | L1 L12 A6 | L12 L20 L14 L3 | L1 L14 L22 L12 | L14 A5 L3 | L1 A7 L14 | L10 L1 L2 L3 | L3 L2 L1 A2 L11 A3
sketch "Sketch7" plane through (0, 12.7, 0) normal (0, 1, 0) x (1, 0, 0)
  line L0 (114.3, -111.125) -> (114.3, 111.125) projected
  line L1 (114.3, 0) -> (104.775, 0)
  line L2 (109.5375, 0) -> (109.5375, 12.7)
  circle A0 centre (109.5375, 12.7) radius 1.5875
  circle A1 centre (109.5375, -12.7) radius 1.5875
  point P0 (0, 0)
  dimension "d48" = 9.525
  dimension "d49" = 12.7
  dimension "d50" = 3.175
extrude "Extrusion7" cut sketch "Sketch7" against normal blind 25.4
sketch "Sketch8" plane through (0, 12.7, 0) normal (0, 1, 0) x (1, 0, 0)
  circle A0 centre (109.5375, -12.7) radius 1.5875 projected
  circle A1 centre (109.5375, -12.7) radius 1.5875 construction
  line L0 (109.5375, -12.7) -> (109.5375, -50.8) construction
  line L1 (109.5375, -50.8) -> (109.5375, -76.2) construction
  circle A2 centre (109.5375, -50.8) radius 1.5875
  circle A3 centre (109.5375, -76.2) radius 1.5875
  line L2 (114.3, 111.125) -> (114.3, -111.125) projected
  line L3 (114.3, 0) -> (96.6606, 0)
  circle A4 centre (109.5375, 50.8) radius 1.5875
  circle A5 centre (109.5375, 76.2) radius 1.5875
  point P0 (0, 0)
  dimension "d53" = 38.1
  dimension "d54" = 25.4
  dimension "d55" = 3.175
  dimension "d56" = 3.175
extrude "Extrusion8" cut sketch "Sketch8" against normal blind 25.4 contours A2 | A3 | A4 | A5
properties part number "TopPlateV1" material "Polyethylene, High Density"
